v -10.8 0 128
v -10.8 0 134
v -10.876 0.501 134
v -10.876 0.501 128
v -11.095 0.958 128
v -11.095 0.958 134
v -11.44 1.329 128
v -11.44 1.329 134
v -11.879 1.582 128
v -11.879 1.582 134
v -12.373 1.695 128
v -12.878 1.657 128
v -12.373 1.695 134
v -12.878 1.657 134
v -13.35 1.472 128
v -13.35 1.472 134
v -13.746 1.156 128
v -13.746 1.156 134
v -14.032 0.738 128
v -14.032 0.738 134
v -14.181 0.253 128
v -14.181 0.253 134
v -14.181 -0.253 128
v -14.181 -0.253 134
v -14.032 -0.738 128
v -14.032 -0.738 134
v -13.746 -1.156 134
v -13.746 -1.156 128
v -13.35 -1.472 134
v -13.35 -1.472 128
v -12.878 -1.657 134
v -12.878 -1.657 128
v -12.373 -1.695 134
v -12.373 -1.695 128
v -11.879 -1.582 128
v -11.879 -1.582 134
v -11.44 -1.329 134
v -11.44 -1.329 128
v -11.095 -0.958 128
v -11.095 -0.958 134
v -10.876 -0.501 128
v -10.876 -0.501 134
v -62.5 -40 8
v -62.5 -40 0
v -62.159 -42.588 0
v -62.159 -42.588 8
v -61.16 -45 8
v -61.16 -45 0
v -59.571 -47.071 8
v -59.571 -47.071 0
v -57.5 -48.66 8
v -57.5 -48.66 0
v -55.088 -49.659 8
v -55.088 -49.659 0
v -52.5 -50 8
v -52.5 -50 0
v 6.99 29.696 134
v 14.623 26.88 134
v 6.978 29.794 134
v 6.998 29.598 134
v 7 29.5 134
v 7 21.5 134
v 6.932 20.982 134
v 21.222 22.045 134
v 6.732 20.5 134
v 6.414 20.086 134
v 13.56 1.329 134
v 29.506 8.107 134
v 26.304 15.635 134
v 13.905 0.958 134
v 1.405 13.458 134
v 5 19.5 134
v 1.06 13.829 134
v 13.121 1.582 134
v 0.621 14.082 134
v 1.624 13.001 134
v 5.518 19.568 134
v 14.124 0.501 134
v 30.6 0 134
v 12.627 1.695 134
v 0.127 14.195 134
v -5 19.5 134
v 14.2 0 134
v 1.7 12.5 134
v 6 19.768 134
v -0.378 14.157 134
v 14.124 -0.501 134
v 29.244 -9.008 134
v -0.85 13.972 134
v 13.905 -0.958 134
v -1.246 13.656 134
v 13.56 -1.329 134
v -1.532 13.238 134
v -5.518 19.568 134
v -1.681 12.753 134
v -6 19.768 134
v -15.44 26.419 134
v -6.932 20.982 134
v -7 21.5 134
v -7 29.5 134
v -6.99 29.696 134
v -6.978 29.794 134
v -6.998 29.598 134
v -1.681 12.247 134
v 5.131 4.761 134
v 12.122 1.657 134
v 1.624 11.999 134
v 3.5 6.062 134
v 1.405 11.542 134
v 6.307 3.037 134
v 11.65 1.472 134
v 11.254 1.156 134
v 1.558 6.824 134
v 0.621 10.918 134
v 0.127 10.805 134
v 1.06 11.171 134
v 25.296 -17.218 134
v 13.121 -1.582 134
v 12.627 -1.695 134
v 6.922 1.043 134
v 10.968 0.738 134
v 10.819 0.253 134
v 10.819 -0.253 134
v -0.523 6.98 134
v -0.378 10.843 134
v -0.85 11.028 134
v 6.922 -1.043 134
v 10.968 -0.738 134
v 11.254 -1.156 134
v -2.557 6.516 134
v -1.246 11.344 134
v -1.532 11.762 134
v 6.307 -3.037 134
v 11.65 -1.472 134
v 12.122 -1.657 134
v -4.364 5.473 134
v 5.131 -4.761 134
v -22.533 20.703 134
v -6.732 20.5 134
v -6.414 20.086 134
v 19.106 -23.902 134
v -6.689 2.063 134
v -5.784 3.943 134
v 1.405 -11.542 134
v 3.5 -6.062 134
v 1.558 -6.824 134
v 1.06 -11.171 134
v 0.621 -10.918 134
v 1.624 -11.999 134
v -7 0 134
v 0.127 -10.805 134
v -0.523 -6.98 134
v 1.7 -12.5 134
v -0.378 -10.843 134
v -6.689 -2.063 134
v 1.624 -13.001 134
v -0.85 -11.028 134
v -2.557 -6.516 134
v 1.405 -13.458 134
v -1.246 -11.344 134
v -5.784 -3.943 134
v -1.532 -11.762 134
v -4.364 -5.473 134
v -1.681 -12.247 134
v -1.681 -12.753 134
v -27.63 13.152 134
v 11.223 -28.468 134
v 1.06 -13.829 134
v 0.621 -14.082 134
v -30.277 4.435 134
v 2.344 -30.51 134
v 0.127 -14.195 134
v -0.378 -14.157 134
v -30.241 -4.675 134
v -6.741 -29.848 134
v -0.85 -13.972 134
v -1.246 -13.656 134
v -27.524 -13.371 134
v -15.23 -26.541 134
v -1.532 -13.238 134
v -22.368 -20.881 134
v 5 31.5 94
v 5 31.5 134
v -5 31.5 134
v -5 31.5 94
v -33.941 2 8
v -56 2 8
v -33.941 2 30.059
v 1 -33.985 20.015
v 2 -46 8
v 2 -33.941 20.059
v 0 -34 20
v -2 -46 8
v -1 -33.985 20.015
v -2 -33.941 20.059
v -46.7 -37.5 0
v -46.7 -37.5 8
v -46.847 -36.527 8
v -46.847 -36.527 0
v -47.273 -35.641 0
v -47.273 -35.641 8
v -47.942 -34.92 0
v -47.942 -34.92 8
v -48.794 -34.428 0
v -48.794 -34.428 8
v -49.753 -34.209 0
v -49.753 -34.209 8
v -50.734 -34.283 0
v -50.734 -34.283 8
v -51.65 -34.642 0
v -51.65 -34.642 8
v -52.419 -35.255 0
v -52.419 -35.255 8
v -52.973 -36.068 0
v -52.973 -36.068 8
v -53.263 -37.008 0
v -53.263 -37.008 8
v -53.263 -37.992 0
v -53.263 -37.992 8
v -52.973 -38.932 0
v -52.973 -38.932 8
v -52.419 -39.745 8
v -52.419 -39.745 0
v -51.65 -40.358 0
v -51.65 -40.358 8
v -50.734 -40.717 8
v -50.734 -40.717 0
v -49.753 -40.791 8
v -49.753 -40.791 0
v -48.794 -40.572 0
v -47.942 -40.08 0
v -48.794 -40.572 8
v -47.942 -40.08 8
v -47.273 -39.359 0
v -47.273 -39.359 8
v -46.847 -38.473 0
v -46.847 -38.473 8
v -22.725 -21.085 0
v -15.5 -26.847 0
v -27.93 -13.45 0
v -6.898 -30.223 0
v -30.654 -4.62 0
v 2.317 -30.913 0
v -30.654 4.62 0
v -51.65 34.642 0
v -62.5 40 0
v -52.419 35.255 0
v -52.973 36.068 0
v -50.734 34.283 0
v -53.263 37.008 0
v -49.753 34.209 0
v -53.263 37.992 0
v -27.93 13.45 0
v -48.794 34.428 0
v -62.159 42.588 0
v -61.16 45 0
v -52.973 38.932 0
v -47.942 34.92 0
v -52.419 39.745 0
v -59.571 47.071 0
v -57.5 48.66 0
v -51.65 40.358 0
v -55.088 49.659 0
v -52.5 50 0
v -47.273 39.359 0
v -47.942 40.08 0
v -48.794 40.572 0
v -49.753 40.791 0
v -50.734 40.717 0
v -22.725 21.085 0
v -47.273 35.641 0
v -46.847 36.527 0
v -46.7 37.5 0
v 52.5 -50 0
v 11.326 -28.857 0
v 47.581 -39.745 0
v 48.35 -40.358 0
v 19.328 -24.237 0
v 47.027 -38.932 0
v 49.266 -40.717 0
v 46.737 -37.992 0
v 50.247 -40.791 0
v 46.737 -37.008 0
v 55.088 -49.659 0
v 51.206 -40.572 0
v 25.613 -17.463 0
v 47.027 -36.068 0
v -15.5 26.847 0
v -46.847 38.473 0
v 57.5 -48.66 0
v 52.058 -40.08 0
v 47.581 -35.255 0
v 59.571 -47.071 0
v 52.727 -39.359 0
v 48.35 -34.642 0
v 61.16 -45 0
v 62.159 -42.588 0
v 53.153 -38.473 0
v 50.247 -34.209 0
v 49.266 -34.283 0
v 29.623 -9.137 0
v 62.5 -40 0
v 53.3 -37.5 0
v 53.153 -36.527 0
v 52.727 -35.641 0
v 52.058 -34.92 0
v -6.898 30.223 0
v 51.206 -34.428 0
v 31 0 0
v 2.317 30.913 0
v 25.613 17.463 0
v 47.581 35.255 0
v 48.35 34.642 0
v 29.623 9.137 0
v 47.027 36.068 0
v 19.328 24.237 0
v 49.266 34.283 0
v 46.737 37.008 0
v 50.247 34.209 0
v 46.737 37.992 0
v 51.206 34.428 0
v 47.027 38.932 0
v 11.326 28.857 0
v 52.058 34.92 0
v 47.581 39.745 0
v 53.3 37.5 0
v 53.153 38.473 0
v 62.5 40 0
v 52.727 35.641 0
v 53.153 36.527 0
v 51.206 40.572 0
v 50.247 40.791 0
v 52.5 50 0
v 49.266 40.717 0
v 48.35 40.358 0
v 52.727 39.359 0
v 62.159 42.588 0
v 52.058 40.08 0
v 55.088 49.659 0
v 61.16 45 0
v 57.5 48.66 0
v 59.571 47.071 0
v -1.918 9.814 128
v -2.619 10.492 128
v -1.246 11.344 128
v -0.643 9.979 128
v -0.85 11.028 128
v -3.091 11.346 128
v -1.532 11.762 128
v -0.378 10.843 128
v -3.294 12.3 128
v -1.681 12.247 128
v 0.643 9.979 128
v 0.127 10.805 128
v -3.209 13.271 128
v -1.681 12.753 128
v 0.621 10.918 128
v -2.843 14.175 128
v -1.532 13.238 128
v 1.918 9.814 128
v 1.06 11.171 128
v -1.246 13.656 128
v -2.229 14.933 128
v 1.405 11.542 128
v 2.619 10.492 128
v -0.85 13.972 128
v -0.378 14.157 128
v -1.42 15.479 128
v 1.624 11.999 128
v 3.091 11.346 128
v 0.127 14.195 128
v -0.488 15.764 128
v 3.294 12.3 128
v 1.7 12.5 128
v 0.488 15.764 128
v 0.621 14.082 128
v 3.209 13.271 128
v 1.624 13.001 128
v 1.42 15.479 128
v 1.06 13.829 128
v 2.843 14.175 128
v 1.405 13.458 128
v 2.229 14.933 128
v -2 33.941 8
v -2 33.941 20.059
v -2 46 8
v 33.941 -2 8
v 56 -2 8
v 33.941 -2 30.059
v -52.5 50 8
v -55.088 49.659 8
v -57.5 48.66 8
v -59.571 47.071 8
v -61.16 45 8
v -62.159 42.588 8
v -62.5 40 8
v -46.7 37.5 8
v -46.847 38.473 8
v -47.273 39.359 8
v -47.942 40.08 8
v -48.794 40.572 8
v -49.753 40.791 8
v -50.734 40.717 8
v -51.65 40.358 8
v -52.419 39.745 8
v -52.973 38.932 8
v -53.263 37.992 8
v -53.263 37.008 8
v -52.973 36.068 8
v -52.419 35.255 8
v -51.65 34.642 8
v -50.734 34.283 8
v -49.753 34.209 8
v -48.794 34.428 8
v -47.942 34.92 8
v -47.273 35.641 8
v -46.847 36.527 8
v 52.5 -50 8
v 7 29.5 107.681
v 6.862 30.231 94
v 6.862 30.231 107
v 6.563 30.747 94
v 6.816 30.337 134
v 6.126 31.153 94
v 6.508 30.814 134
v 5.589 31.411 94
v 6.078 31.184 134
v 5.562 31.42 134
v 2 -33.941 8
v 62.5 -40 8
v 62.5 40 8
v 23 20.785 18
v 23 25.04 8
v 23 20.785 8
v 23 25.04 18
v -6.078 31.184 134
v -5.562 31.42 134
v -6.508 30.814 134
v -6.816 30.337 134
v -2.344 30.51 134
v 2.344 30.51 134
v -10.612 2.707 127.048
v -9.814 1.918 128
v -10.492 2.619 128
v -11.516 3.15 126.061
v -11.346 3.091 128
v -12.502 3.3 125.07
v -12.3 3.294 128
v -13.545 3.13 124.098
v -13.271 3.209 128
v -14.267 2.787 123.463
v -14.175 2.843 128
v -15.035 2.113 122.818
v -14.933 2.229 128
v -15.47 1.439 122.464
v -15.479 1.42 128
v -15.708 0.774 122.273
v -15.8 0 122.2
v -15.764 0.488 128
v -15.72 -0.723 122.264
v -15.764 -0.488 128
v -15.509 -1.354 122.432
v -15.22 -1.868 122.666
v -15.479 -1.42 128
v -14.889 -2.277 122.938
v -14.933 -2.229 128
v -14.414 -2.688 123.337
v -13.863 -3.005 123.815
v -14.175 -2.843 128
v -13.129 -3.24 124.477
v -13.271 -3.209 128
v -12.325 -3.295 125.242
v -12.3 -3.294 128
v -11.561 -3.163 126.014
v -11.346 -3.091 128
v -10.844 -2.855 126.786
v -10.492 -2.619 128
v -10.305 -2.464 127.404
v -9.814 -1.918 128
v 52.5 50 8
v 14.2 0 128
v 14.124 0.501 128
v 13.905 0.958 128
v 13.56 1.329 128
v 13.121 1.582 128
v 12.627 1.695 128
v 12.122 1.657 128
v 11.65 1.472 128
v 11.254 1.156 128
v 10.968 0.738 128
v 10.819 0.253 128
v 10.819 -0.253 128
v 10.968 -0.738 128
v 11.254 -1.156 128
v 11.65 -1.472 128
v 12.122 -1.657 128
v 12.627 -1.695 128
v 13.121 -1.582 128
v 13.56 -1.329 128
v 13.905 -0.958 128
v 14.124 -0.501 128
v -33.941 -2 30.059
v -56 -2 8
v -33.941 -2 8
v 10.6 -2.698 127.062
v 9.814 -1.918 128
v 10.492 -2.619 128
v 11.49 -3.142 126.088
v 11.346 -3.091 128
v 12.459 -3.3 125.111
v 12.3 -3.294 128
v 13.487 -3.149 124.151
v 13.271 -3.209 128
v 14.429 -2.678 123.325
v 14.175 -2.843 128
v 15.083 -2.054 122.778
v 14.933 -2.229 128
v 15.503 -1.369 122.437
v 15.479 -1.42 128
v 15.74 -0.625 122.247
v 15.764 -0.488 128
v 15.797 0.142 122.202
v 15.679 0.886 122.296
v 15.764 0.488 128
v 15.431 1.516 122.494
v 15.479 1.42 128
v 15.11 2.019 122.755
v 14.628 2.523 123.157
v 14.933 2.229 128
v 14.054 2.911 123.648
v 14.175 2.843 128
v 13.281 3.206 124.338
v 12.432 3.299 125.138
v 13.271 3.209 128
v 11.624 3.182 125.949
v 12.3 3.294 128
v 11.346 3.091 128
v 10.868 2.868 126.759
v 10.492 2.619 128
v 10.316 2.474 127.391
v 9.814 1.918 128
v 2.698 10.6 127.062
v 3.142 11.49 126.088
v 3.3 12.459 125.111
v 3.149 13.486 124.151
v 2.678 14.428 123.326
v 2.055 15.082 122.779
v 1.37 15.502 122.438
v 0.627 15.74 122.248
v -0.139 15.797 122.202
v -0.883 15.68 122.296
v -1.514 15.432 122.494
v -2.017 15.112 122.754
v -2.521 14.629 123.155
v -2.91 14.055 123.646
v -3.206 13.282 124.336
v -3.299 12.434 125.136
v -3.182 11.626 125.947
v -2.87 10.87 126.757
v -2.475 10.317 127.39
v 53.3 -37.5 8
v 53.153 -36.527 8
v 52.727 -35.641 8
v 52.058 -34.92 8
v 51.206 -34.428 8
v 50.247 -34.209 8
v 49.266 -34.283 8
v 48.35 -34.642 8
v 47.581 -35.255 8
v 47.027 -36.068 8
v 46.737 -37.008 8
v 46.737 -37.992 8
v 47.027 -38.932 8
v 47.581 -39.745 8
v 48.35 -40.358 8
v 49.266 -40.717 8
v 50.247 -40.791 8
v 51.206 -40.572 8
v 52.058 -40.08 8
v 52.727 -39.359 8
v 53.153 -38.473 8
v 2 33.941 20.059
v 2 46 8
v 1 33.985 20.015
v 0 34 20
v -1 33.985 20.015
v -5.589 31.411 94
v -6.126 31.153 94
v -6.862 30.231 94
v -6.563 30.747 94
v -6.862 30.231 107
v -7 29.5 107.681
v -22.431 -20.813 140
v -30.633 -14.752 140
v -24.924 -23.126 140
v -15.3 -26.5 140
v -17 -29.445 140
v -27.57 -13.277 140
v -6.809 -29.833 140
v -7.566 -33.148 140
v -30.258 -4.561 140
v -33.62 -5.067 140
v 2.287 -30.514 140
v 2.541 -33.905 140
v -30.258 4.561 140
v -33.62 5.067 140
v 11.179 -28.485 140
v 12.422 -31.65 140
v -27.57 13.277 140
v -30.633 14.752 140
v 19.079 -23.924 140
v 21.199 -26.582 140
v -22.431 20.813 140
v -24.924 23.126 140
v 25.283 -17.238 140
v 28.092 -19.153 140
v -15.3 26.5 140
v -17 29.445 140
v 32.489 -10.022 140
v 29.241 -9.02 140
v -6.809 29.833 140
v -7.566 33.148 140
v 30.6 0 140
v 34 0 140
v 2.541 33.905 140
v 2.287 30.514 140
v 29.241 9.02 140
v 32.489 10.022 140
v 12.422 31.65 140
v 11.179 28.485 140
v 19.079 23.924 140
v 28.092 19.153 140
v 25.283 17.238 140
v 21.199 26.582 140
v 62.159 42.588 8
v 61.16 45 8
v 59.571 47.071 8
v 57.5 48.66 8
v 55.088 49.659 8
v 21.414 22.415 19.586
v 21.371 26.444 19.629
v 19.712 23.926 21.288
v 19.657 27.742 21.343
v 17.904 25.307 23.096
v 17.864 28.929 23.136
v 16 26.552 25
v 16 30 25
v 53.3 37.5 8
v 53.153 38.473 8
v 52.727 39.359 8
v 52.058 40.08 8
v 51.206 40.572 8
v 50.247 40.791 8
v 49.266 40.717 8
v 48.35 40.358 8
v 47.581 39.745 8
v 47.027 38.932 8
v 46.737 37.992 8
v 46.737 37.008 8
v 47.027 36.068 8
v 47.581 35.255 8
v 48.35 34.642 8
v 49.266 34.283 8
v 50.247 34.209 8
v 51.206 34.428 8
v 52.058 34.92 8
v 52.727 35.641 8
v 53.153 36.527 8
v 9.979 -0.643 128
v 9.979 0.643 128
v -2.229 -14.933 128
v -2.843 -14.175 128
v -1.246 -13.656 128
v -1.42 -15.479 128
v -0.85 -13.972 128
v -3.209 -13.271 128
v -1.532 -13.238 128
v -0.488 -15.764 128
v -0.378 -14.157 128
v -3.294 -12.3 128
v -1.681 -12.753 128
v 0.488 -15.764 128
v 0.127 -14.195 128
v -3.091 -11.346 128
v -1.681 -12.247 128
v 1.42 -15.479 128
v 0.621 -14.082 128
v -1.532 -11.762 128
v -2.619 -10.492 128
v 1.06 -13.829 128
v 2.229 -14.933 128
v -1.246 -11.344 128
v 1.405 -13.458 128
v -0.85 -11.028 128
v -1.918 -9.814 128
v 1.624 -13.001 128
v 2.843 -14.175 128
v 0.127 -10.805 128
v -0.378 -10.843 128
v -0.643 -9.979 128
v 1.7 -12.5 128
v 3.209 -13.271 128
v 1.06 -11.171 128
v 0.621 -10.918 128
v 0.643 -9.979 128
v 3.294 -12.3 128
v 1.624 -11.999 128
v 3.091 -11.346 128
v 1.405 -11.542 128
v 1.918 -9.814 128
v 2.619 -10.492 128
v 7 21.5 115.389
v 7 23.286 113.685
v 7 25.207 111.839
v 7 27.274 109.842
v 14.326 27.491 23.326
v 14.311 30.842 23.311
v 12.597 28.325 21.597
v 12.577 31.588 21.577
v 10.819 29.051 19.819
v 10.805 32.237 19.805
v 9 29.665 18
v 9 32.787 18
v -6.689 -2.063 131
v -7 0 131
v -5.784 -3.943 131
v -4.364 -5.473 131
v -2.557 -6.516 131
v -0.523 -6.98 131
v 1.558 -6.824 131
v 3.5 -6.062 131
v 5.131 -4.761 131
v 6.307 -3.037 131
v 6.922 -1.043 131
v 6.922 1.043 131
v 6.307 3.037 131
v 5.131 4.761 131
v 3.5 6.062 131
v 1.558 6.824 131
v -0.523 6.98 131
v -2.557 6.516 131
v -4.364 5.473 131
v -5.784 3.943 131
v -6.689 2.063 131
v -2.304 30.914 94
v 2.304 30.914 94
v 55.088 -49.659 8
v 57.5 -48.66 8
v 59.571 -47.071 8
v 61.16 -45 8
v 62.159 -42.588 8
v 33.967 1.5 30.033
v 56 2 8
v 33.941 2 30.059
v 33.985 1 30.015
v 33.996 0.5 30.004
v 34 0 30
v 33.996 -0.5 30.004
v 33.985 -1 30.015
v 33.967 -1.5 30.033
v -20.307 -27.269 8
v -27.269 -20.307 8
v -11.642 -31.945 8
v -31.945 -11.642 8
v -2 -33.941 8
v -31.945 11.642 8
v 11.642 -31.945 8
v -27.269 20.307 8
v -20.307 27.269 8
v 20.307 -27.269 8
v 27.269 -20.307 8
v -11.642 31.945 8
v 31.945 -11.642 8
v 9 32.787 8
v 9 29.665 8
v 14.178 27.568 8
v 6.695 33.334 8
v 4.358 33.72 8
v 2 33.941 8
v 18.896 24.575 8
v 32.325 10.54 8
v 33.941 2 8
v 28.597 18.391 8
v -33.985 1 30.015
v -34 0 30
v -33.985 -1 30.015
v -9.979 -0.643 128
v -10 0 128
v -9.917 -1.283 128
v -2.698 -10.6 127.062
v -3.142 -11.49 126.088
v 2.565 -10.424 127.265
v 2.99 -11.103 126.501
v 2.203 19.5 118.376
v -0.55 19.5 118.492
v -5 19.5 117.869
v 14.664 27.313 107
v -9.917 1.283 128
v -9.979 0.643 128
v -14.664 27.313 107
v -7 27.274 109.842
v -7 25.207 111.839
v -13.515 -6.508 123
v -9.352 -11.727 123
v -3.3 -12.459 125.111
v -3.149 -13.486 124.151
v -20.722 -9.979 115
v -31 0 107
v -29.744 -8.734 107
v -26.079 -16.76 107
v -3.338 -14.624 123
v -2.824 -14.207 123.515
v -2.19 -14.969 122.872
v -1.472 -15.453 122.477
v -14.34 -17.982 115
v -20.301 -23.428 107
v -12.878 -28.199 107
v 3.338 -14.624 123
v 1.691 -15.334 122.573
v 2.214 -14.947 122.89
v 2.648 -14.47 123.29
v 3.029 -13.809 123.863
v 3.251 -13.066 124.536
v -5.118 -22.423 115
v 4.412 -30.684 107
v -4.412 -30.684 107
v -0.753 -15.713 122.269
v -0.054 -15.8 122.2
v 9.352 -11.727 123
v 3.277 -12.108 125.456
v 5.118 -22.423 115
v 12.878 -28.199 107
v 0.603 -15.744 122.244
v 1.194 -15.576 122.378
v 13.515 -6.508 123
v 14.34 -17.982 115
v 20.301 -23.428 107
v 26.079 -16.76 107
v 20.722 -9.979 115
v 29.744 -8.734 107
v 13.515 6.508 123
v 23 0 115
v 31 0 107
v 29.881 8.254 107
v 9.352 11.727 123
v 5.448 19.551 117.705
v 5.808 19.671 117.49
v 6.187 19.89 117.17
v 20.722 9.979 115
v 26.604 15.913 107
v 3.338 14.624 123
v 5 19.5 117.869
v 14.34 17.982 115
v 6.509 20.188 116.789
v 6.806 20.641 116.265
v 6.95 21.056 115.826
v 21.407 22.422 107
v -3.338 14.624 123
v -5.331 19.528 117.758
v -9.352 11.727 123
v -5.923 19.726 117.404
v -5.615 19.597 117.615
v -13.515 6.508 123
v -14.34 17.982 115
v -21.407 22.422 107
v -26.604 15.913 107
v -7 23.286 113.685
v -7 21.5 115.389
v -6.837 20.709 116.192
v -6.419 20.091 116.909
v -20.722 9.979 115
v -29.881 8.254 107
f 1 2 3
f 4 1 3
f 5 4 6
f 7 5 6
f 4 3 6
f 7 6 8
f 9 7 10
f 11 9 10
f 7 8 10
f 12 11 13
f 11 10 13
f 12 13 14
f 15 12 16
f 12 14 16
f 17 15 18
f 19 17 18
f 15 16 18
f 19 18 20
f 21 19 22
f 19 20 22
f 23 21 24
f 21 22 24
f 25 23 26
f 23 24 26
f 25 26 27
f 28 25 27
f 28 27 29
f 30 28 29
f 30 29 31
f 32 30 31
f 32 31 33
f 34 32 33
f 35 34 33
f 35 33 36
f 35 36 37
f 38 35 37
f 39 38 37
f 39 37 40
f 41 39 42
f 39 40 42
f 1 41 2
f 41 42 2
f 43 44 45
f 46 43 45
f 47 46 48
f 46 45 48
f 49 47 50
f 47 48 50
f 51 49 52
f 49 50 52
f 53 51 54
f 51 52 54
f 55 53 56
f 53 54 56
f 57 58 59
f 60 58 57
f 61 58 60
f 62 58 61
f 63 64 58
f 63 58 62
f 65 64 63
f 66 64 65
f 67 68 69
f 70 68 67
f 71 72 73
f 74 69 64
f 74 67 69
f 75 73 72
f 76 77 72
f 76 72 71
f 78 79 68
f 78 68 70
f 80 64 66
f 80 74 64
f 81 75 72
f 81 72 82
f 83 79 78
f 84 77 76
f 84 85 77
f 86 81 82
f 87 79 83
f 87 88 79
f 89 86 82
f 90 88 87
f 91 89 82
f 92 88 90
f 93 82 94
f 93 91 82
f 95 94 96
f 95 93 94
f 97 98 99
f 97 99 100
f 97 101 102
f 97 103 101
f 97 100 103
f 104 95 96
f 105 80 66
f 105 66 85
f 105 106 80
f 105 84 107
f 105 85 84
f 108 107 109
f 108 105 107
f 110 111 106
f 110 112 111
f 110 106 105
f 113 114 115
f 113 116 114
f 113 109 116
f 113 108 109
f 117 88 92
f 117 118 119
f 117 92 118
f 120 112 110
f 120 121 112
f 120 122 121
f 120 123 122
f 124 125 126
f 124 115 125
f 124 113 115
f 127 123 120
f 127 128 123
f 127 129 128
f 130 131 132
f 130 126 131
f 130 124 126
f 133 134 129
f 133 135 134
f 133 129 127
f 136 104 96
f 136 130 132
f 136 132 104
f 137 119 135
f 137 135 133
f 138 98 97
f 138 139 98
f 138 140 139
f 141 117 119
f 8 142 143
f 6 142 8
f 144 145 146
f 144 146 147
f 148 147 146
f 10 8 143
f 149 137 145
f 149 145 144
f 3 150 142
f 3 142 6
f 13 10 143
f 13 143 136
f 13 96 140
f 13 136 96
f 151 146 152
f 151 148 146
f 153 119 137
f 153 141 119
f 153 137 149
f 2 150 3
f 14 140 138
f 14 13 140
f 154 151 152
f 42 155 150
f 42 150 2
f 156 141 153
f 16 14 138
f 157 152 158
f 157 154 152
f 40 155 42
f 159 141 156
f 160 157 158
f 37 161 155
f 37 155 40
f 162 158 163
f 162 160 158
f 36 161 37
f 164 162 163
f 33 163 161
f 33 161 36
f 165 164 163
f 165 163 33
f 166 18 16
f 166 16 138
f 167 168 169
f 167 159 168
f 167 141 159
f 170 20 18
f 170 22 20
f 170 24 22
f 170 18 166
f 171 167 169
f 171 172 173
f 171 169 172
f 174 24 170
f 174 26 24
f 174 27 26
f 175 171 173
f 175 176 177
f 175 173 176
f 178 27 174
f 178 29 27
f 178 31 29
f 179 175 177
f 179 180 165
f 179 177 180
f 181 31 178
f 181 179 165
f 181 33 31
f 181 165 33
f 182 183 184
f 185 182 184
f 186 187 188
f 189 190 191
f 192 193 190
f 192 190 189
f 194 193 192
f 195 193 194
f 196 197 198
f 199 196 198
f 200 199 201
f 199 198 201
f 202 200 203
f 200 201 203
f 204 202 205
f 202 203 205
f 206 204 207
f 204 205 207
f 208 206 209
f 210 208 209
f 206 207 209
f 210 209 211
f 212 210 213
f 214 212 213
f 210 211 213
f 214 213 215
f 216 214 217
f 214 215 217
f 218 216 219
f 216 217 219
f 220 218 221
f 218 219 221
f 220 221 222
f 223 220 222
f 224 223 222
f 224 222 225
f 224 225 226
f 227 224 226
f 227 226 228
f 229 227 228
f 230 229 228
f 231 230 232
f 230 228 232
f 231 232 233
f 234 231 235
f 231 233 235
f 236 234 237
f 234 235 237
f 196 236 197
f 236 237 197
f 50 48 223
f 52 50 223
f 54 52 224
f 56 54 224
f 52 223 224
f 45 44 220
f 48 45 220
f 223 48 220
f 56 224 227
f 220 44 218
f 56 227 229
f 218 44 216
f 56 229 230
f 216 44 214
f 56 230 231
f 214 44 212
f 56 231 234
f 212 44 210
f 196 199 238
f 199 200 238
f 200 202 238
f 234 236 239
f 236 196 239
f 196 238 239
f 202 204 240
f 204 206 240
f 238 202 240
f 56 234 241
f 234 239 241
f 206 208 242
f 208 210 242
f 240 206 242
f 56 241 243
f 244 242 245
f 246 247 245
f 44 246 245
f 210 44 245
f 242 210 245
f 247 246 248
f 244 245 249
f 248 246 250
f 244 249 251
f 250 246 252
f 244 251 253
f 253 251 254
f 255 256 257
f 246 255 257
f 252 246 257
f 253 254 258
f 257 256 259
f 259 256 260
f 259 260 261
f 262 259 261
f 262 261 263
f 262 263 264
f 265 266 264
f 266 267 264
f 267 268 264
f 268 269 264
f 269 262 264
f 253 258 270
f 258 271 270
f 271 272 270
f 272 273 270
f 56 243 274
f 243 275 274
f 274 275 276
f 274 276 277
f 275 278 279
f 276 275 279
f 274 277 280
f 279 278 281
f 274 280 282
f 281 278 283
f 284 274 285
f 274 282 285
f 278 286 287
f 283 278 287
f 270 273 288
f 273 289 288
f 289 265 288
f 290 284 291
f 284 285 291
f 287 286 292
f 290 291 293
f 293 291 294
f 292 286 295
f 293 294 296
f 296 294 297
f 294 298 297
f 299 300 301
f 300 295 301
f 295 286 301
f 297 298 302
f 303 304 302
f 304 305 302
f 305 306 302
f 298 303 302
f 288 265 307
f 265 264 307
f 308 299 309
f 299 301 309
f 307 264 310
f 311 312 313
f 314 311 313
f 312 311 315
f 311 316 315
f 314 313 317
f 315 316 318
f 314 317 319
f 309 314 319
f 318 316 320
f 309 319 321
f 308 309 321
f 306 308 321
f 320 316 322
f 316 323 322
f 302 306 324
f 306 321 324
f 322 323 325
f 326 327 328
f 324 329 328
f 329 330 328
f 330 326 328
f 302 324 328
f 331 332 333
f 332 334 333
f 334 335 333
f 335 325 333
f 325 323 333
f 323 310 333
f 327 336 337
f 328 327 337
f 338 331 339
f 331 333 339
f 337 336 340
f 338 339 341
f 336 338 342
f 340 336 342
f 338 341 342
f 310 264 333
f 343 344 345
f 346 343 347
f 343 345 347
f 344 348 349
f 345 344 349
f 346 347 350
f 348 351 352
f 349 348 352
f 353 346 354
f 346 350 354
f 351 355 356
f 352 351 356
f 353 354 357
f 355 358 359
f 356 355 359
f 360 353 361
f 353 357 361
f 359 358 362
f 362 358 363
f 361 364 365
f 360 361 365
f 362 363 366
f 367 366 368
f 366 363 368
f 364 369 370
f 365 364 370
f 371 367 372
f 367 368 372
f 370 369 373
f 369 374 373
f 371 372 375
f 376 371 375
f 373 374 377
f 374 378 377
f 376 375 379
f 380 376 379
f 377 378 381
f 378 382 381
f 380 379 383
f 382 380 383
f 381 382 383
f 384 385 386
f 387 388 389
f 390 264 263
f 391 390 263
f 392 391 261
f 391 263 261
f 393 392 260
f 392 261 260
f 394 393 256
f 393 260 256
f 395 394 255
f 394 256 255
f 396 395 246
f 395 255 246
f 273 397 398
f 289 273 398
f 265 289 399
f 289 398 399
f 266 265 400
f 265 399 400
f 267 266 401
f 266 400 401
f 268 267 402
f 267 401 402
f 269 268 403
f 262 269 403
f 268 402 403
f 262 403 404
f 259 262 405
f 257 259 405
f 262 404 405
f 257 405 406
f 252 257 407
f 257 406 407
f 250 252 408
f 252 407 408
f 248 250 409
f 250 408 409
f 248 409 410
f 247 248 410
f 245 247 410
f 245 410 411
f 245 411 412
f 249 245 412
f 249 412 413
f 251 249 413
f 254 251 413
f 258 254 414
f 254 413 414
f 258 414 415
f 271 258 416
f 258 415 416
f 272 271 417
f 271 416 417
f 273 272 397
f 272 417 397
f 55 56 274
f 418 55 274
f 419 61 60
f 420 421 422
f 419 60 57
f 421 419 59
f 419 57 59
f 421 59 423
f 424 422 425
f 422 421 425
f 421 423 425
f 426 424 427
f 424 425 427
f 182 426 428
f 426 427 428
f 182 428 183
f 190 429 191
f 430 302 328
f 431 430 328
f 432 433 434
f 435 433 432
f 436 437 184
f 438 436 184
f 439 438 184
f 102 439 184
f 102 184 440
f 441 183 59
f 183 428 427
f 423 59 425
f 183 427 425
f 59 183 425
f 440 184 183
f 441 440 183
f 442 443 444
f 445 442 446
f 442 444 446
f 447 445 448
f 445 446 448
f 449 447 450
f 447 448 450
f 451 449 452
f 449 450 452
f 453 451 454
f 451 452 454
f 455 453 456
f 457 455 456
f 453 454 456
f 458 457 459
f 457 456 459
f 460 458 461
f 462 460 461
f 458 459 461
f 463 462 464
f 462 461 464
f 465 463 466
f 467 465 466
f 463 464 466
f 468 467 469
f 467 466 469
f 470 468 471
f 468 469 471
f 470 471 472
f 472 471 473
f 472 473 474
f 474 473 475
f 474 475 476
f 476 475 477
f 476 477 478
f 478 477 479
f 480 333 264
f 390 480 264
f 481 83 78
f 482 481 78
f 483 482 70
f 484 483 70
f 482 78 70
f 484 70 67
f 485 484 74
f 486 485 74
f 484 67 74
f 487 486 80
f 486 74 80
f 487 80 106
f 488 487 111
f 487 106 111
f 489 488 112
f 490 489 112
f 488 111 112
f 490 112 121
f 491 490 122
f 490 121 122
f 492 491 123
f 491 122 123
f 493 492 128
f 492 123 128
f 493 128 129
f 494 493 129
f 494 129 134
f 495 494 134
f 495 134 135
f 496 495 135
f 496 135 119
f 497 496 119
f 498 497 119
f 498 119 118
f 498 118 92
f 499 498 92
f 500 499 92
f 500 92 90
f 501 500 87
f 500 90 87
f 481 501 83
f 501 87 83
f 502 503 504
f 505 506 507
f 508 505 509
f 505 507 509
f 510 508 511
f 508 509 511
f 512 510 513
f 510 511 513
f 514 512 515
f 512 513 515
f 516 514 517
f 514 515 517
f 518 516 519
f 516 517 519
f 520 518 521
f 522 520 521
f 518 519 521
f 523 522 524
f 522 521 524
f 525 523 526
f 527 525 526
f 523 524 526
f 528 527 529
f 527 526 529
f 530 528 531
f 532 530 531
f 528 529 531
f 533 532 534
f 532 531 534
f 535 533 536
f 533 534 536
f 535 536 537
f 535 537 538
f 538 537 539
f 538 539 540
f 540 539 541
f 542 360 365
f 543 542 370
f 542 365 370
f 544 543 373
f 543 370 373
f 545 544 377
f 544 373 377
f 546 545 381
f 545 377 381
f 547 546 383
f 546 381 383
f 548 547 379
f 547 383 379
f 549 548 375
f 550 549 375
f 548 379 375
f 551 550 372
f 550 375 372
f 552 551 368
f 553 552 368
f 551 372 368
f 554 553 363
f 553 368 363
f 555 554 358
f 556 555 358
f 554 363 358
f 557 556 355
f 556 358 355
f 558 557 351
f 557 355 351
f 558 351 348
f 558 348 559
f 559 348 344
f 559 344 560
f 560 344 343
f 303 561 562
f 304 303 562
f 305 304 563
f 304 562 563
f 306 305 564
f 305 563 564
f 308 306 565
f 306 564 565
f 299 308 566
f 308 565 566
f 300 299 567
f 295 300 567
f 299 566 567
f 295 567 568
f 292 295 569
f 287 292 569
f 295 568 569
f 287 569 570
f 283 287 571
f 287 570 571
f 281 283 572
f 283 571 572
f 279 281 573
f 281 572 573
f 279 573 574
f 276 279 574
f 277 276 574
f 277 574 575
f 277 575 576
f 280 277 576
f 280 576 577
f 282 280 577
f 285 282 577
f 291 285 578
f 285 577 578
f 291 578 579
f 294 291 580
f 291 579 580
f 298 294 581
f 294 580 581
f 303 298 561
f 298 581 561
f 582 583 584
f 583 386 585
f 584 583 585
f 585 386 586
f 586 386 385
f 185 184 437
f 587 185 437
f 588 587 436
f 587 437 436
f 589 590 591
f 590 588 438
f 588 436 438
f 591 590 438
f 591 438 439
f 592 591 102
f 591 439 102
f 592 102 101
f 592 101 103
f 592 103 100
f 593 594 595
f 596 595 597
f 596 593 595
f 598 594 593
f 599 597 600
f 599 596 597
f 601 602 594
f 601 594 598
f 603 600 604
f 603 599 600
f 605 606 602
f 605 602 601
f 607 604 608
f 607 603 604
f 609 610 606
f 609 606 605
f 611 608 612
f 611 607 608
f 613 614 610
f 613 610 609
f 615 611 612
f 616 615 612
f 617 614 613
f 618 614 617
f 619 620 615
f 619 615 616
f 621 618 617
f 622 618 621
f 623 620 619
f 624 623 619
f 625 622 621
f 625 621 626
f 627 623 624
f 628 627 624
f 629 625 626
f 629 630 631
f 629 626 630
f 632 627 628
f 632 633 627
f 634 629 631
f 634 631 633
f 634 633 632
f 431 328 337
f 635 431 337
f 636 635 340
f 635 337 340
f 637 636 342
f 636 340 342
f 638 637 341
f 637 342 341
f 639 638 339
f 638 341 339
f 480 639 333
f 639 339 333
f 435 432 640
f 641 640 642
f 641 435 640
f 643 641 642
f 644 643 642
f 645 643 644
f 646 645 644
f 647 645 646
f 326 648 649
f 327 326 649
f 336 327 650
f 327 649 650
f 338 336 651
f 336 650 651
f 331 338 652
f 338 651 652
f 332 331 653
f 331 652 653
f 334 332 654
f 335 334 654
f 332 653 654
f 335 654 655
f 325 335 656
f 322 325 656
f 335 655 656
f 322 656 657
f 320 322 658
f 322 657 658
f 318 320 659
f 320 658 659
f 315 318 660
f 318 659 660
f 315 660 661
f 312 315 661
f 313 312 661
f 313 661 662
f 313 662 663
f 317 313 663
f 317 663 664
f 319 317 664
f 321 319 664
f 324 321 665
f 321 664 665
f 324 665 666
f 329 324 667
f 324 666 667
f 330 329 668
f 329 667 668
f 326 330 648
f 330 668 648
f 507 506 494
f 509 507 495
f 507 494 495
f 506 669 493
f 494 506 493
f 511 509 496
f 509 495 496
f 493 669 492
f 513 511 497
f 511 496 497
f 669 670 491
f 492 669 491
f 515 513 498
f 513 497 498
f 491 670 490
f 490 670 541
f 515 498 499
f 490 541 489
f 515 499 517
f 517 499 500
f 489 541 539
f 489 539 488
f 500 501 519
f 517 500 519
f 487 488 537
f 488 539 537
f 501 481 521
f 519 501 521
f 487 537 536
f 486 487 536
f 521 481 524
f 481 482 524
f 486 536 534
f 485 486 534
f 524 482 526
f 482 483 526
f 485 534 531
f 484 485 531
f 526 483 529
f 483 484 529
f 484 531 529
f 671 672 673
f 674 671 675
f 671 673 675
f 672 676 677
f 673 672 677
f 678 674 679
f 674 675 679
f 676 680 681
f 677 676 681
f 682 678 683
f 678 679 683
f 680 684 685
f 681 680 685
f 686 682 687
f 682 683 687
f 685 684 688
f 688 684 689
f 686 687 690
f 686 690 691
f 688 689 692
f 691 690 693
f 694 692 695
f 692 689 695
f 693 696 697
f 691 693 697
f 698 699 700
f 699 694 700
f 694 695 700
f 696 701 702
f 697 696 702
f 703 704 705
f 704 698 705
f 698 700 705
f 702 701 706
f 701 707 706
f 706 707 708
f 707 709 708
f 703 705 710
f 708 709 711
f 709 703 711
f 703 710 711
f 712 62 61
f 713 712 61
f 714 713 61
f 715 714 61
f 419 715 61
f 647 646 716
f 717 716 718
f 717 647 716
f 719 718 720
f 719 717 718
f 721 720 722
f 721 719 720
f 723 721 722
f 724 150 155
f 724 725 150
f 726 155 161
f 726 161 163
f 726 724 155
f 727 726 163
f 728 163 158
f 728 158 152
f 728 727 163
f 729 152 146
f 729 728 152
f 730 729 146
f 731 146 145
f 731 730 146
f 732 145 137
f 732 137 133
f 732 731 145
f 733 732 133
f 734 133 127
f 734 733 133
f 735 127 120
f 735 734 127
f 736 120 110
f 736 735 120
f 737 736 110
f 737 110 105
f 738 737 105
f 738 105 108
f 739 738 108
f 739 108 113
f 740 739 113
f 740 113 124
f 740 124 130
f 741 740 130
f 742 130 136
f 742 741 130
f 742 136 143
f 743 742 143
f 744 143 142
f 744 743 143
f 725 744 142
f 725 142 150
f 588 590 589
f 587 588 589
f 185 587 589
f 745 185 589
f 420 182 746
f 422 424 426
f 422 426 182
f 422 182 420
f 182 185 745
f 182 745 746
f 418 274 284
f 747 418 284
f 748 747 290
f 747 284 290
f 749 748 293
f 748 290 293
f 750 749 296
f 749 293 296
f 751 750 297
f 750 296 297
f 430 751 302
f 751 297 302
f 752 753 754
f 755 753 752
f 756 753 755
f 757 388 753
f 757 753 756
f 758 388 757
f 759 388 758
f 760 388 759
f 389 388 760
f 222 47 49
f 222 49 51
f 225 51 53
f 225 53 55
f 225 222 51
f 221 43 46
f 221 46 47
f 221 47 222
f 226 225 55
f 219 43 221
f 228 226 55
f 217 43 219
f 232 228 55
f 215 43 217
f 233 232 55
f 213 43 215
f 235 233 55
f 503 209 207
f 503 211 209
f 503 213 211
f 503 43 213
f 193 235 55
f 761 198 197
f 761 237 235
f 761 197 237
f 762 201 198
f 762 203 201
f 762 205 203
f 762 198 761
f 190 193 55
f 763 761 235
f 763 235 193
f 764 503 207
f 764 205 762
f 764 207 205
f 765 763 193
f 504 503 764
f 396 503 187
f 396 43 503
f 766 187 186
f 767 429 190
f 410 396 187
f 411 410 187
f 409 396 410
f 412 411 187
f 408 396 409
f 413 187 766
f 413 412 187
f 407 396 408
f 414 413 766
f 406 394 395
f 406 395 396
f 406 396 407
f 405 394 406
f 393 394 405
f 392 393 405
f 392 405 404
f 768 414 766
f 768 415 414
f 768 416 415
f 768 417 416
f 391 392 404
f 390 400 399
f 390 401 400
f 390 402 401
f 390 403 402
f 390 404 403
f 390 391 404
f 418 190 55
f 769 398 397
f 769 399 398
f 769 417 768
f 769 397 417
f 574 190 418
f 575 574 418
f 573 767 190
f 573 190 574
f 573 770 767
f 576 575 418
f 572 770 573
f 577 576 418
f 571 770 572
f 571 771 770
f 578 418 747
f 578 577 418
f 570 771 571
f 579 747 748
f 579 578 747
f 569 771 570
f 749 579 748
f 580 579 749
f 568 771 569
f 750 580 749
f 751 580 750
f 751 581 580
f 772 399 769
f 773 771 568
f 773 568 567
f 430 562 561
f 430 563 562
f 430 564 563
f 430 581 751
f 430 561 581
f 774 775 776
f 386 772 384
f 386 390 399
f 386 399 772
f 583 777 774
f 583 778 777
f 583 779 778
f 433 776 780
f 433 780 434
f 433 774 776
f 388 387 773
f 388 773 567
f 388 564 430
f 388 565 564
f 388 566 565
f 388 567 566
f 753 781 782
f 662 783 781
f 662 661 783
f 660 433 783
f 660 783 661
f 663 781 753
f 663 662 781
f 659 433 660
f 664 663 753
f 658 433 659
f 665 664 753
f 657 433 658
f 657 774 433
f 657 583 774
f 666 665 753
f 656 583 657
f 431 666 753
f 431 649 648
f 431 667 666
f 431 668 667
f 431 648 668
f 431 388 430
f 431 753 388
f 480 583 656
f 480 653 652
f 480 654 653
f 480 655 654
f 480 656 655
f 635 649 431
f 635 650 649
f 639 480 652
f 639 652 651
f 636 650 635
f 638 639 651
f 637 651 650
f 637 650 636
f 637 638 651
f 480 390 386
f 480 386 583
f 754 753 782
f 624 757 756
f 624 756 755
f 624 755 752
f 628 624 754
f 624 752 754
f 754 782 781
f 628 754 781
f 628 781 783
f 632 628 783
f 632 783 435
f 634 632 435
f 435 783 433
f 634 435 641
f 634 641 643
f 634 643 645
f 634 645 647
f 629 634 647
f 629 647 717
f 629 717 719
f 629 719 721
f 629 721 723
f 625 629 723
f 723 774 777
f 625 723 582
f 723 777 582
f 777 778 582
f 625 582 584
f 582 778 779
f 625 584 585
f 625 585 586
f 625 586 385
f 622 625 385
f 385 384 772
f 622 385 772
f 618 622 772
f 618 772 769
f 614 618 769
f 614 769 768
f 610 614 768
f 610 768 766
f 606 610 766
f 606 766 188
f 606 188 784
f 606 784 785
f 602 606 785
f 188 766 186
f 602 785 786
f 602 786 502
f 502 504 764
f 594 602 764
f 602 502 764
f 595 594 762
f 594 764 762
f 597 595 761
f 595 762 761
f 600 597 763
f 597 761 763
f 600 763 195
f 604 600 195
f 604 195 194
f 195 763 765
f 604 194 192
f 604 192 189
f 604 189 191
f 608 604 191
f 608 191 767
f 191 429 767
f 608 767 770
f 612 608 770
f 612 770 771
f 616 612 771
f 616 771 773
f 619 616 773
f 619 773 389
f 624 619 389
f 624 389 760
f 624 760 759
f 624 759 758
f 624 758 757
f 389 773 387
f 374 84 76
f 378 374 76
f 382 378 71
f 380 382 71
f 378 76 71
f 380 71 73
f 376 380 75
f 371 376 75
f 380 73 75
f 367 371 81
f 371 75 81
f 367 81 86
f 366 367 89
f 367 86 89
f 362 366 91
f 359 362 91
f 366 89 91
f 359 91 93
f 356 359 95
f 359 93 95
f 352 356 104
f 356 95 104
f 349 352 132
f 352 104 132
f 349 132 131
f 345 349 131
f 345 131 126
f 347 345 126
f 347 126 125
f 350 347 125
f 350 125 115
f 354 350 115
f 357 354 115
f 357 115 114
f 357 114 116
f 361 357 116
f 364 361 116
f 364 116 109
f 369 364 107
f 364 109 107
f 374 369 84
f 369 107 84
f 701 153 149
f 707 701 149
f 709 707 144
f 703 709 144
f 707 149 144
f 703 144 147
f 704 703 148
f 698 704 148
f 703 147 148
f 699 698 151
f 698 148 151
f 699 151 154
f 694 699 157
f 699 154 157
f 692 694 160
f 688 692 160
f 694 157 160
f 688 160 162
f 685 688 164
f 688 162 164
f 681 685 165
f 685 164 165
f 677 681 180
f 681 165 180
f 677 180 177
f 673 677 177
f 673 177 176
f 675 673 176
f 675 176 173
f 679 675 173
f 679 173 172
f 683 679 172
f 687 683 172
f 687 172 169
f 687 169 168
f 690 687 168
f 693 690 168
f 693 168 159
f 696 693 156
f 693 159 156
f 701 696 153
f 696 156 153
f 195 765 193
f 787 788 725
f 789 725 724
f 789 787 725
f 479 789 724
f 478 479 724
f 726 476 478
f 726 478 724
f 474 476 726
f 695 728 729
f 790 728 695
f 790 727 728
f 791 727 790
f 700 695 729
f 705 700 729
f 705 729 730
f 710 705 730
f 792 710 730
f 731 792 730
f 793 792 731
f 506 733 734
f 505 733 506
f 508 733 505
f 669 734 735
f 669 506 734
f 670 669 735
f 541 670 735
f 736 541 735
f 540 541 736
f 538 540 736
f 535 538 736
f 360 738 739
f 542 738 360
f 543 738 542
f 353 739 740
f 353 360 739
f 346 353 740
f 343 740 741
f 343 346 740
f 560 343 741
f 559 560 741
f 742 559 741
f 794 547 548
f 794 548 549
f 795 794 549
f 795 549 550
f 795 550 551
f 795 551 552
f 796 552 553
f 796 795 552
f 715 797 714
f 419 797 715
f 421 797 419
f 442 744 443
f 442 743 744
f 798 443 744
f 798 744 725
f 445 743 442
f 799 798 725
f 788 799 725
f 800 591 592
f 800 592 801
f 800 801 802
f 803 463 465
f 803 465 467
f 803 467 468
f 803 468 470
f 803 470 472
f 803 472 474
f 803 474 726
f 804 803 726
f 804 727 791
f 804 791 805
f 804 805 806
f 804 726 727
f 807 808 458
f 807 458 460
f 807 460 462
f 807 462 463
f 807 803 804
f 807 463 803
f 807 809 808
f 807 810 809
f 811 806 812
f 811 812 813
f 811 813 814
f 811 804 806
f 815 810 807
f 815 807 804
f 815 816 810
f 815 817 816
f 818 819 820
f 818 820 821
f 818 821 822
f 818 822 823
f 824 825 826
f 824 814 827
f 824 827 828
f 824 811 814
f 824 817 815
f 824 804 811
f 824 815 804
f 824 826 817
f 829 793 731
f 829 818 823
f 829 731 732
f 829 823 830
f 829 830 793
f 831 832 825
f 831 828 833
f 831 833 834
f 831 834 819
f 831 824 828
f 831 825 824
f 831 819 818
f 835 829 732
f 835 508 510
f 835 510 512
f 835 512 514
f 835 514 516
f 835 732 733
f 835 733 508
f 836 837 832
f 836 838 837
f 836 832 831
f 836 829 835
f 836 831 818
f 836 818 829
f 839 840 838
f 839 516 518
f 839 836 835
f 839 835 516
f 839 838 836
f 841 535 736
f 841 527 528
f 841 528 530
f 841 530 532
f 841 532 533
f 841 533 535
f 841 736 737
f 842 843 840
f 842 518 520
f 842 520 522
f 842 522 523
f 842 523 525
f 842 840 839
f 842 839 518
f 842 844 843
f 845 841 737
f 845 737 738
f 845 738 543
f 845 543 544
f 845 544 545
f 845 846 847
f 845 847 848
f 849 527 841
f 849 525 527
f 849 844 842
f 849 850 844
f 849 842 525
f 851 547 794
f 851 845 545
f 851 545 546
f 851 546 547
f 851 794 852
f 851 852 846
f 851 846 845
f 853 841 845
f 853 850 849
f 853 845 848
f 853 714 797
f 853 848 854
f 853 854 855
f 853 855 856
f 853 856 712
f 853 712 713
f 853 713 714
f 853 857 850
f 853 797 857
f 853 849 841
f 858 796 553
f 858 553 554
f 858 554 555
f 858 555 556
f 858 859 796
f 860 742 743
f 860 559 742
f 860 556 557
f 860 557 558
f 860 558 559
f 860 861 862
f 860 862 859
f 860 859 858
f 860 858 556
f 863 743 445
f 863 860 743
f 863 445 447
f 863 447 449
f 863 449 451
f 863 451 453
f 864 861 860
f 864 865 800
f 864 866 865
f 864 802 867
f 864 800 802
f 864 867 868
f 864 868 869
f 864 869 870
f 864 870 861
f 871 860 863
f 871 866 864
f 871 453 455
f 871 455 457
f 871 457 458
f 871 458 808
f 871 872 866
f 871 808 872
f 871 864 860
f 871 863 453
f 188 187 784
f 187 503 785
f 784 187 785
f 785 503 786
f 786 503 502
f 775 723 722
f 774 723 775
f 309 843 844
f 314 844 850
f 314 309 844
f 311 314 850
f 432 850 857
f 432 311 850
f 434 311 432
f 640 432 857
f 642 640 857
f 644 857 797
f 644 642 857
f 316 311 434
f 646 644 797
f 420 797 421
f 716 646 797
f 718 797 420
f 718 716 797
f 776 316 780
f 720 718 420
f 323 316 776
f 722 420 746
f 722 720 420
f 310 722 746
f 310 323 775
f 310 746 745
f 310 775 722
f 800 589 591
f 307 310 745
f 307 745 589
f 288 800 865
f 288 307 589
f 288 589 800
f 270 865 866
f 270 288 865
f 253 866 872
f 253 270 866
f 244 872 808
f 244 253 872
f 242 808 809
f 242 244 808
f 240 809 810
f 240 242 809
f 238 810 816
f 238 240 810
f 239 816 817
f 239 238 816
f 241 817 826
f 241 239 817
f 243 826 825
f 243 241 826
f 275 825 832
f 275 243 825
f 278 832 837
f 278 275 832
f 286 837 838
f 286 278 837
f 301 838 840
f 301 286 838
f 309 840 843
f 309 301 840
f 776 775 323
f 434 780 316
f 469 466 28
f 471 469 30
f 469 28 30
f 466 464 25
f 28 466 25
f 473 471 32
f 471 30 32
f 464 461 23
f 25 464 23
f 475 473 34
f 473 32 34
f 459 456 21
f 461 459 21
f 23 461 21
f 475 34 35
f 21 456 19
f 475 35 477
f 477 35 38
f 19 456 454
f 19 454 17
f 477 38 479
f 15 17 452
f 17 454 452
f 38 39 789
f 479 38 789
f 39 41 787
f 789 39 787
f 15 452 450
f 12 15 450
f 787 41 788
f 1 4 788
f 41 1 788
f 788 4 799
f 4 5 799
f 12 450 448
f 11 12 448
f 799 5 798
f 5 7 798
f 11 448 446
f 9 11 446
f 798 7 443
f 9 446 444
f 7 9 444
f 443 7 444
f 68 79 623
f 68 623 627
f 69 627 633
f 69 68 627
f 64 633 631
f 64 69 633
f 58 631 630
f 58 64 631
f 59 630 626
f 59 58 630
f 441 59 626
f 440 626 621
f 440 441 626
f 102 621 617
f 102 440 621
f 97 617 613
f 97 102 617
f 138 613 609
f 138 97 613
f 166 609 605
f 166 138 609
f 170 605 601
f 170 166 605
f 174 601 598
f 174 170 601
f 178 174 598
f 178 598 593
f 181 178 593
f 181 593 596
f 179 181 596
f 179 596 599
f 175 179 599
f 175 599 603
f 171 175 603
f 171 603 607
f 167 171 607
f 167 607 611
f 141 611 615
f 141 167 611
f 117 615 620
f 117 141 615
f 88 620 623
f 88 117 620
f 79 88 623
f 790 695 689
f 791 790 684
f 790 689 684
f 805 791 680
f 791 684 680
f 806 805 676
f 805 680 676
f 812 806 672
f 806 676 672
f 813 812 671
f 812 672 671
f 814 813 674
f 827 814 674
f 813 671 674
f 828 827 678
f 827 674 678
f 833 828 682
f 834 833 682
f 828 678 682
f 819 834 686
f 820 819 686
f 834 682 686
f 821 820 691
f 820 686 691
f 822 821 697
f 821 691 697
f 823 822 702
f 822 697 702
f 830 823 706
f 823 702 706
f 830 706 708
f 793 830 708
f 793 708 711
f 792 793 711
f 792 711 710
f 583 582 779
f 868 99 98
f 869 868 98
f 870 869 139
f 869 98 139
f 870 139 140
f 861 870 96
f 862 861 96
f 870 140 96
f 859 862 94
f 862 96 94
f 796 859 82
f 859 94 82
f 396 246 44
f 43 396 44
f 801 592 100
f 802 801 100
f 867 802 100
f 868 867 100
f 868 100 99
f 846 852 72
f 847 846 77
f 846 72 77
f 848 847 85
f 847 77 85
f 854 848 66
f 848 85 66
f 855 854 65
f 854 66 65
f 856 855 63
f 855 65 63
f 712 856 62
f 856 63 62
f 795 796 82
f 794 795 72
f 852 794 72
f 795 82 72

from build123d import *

# Parameters (mm, degrees)
SKETCH_1_R                                     = 31
FOOT_125X100_R10_T8_OPEN_D62_DEPTH             = 8
SKETCH_2_R                                     = 3.3
M6_GRID25_100X75_DEPTH                         = 8
SKETCH_3_R                                     = 34
SKETCH_3_R_2                                   = 31
HOLLOW_COLUMN_OD68_ID62_TOZ134_DEPTH           = 126
SKETCH_5_R                                     = 34
SKETCH_5_R_2                                   = 30.6
BOTTOM_CAP_WRAP_OD68_ID61P2_H6_DEPTH           = 6
STRAIGHT_TRIANGULAR_RIB_T4_NO_FILLETS_X_DEPTH  = 4
STRAIGHT_TRIANGULAR_RIB_T4_NO_FILLETS_Y_DEPTH  = 4
SKETCH_8_R                                     = 1.7
STATOR_4XM3_PCD25_THROUGH_WEB_DEPTH            = 6
SKETCH_9_R                                     = 3.3
UNDERSIDE_BOLT_AND_DRIVER_WELLS_D6P6_DEPTH     = 24
INNER_WALL_WIRE_GROOVE_W14_R2_DEPTH40_NO_DEPTH = 40
BOTTOM_REAR_OFFSET_WIRE_EXIT_14X10_45DEG_DEPTH = 25


with BuildPart() as part:
    # 草图1 → Foot_125x100_R10_T8_open_D62 (new body)
    with BuildSketch(Plane.XY):
        with BuildLine():
            Line((-52.5, -50), (52.5, -50))
            ThreePointArc((52.5, -50), (59.571067812, -47.071067812), (62.5, -40))
            Line((62.5, -40), (62.5, 40))
            ThreePointArc((62.5, 40), (59.571067812, 47.071067812), (52.5, 50))
            Line((52.5, 50), (-52.5, 50))
            ThreePointArc((-52.5, 50), (-59.571067812, 47.071067812), (-62.5, 40))
            Line((-62.5, 40), (-62.5, -40))
            ThreePointArc((-62.5, -40), (-59.571067812, -47.071067812), (-52.5, -50))
        make_face()
        Circle(SKETCH_1_R, mode=Mode.SUBTRACT)
    extrude(amount=FOOT_125X100_R10_T8_OPEN_D62_DEPTH)

    # 草图2 → M6_grid25_100x75 (cut)
    with BuildSketch(Plane.XY.offset(8)):
        with Locations((-50, -37.5)):
            Circle(SKETCH_2_R)
        with Locations((-50, 37.5)):
            Circle(SKETCH_2_R)
        with Locations((50, -37.5)):
            Circle(SKETCH_2_R)
        with Locations((50, 37.5)):
            Circle(SKETCH_2_R)
    extrude(amount=-M6_GRID25_100X75_DEPTH, mode=Mode.SUBTRACT)

    # 草图3 → Hollow_column_OD68_ID62_toZ134 (add)
    with BuildSketch(Plane.XY.offset(8)):
        Circle(SKETCH_3_R)
        Circle(SKETCH_3_R_2, mode=Mode.SUBTRACT)
    extrude(amount=HOLLOW_COLUMN_OD68_ID62_TOZ134_DEPTH)

    # 草图4 → Integral_motor_seat_45deg_internal_closure (revolve)
    with BuildSketch(Plane(origin=(0, 0, 0), x_dir=(1, 0, 0), z_dir=(0, 1, 0)), mode=Mode.PRIVATE) as integral_motor_seat_45deg_internal_closu_sk:
        Polygon((7, -131), (31, -107), (34, -107), (34, -134), (7, -134), align=None)
    revolve(integral_motor_seat_45deg_internal_closu_sk.sketch.rotate(Axis((0, 0, 0), (0, 0, 1)), 180), axis=Axis((0, 0, 0), (0, 0, 1)))

    # 草图5 → Bottom_cap_wrap_OD68_ID61p2_H6 (add)
    with BuildSketch(Plane.XY.offset(134)):
        Circle(SKETCH_5_R)
        Circle(SKETCH_5_R_2, mode=Mode.SUBTRACT)
    extrude(amount=BOTTOM_CAP_WRAP_OD68_ID61P2_H6_DEPTH)

    # 草图6 → Straight_triangular_rib_T4_no_fillets_x (add)
    with BuildSketch(Plane(origin=(-2, 0, 0), x_dir=(0, 0, -1), z_dir=(1, 0, 0))):
        Polygon((-8, -32), (-8, -46), (-22, -32), align=None)
        Polygon((-8, 32), (-8, 46), (-22, 32), align=None)
    extrude(amount=STRAIGHT_TRIANGULAR_RIB_T4_NO_FILLETS_X_DEPTH)

    # 草图7 → Straight_triangular_rib_T4_no_fillets_y (add)
    with BuildSketch(Plane(origin=(0, -2, 0), x_dir=(1, 0, 0), z_dir=(0, 1, 0))):
        Polygon((-32, -8), (-56, -8), (-32, -32), align=None)
        Polygon((32, -8), (56, -8), (32, -32), align=None)
    extrude(amount=STRAIGHT_TRIANGULAR_RIB_T4_NO_FILLETS_Y_DEPTH)

    # 草图8 → Stator_4xM3_PCD25_through_web (cut)
    with BuildSketch(Plane.XY.offset(134)):
        with Locations((12.5, 0)):
            Circle(SKETCH_8_R)
        with Locations((0, 12.5)):
            Circle(SKETCH_8_R)
        with Locations((-12.5, 0)):
            Circle(SKETCH_8_R)
        with Locations((0, -12.5)):
            Circle(SKETCH_8_R)
    extrude(amount=-STATOR_4XM3_PCD25_THROUGH_WEB_DEPTH, mode=Mode.SUBTRACT)

    # 草图9 → Underside_bolt_and_driver_wells_D6p6 (cut)
    with BuildSketch(Plane.XY.offset(128)):
        with Locations((12.5, 0)):
            Circle(SKETCH_9_R)
        with Locations((0, 12.5)):
            Circle(SKETCH_9_R)
        with Locations((-12.5, 0)):
            Circle(SKETCH_9_R)
        with Locations((0, -12.5)):
            Circle(SKETCH_9_R)
    extrude(amount=-UNDERSIDE_BOLT_AND_DRIVER_WELLS_D6P6_DEPTH, mode=Mode.SUBTRACT)

    # 草图10 → Inner_wall_wire_groove_W14_R2_depth40_no_external_bulge (cut)
    with BuildSketch(Plane.XY.offset(134)):
        with BuildLine():
            Line((-5, 19.5), (5, 19.5))
            ThreePointArc((5, 19.5), (6.414213562, 20.085786438), (7, 21.5))
            Line((7, 21.5), (7, 29.5))
            ThreePointArc((7, 29.5), (6.414213562, 30.914213562), (5, 31.5))
            Line((5, 31.5), (-5, 31.5))
            ThreePointArc((-5, 31.5), (-6.414213562, 30.914213562), (-7, 29.5))
            Line((-7, 29.5), (-7, 21.5))
            ThreePointArc((-7, 21.5), (-6.414213562, 20.085786438), (-5, 19.5))
        make_face()
    extrude(amount=-INNER_WALL_WIRE_GROOVE_W14_R2_DEPTH40_NO_DEPTH, mode=Mode.SUBTRACT)

    # 草图11 → Bottom_rear_offset_wire_exit_14x10_45deg_roof (cut)
    with BuildSketch(Plane(origin=(0, 40, 0), x_dir=(1, 0, 0), z_dir=(0, 1, 0))):
        Polygon((9, -8), (23, -8), (23, -18), (16, -25), (9, -18), align=None)
    extrude(amount=-BOTTOM_REAR_OFFSET_WIRE_EXIT_14X10_45DEG_DEPTH, mode=Mode.SUBTRACT)


solid = part.part
